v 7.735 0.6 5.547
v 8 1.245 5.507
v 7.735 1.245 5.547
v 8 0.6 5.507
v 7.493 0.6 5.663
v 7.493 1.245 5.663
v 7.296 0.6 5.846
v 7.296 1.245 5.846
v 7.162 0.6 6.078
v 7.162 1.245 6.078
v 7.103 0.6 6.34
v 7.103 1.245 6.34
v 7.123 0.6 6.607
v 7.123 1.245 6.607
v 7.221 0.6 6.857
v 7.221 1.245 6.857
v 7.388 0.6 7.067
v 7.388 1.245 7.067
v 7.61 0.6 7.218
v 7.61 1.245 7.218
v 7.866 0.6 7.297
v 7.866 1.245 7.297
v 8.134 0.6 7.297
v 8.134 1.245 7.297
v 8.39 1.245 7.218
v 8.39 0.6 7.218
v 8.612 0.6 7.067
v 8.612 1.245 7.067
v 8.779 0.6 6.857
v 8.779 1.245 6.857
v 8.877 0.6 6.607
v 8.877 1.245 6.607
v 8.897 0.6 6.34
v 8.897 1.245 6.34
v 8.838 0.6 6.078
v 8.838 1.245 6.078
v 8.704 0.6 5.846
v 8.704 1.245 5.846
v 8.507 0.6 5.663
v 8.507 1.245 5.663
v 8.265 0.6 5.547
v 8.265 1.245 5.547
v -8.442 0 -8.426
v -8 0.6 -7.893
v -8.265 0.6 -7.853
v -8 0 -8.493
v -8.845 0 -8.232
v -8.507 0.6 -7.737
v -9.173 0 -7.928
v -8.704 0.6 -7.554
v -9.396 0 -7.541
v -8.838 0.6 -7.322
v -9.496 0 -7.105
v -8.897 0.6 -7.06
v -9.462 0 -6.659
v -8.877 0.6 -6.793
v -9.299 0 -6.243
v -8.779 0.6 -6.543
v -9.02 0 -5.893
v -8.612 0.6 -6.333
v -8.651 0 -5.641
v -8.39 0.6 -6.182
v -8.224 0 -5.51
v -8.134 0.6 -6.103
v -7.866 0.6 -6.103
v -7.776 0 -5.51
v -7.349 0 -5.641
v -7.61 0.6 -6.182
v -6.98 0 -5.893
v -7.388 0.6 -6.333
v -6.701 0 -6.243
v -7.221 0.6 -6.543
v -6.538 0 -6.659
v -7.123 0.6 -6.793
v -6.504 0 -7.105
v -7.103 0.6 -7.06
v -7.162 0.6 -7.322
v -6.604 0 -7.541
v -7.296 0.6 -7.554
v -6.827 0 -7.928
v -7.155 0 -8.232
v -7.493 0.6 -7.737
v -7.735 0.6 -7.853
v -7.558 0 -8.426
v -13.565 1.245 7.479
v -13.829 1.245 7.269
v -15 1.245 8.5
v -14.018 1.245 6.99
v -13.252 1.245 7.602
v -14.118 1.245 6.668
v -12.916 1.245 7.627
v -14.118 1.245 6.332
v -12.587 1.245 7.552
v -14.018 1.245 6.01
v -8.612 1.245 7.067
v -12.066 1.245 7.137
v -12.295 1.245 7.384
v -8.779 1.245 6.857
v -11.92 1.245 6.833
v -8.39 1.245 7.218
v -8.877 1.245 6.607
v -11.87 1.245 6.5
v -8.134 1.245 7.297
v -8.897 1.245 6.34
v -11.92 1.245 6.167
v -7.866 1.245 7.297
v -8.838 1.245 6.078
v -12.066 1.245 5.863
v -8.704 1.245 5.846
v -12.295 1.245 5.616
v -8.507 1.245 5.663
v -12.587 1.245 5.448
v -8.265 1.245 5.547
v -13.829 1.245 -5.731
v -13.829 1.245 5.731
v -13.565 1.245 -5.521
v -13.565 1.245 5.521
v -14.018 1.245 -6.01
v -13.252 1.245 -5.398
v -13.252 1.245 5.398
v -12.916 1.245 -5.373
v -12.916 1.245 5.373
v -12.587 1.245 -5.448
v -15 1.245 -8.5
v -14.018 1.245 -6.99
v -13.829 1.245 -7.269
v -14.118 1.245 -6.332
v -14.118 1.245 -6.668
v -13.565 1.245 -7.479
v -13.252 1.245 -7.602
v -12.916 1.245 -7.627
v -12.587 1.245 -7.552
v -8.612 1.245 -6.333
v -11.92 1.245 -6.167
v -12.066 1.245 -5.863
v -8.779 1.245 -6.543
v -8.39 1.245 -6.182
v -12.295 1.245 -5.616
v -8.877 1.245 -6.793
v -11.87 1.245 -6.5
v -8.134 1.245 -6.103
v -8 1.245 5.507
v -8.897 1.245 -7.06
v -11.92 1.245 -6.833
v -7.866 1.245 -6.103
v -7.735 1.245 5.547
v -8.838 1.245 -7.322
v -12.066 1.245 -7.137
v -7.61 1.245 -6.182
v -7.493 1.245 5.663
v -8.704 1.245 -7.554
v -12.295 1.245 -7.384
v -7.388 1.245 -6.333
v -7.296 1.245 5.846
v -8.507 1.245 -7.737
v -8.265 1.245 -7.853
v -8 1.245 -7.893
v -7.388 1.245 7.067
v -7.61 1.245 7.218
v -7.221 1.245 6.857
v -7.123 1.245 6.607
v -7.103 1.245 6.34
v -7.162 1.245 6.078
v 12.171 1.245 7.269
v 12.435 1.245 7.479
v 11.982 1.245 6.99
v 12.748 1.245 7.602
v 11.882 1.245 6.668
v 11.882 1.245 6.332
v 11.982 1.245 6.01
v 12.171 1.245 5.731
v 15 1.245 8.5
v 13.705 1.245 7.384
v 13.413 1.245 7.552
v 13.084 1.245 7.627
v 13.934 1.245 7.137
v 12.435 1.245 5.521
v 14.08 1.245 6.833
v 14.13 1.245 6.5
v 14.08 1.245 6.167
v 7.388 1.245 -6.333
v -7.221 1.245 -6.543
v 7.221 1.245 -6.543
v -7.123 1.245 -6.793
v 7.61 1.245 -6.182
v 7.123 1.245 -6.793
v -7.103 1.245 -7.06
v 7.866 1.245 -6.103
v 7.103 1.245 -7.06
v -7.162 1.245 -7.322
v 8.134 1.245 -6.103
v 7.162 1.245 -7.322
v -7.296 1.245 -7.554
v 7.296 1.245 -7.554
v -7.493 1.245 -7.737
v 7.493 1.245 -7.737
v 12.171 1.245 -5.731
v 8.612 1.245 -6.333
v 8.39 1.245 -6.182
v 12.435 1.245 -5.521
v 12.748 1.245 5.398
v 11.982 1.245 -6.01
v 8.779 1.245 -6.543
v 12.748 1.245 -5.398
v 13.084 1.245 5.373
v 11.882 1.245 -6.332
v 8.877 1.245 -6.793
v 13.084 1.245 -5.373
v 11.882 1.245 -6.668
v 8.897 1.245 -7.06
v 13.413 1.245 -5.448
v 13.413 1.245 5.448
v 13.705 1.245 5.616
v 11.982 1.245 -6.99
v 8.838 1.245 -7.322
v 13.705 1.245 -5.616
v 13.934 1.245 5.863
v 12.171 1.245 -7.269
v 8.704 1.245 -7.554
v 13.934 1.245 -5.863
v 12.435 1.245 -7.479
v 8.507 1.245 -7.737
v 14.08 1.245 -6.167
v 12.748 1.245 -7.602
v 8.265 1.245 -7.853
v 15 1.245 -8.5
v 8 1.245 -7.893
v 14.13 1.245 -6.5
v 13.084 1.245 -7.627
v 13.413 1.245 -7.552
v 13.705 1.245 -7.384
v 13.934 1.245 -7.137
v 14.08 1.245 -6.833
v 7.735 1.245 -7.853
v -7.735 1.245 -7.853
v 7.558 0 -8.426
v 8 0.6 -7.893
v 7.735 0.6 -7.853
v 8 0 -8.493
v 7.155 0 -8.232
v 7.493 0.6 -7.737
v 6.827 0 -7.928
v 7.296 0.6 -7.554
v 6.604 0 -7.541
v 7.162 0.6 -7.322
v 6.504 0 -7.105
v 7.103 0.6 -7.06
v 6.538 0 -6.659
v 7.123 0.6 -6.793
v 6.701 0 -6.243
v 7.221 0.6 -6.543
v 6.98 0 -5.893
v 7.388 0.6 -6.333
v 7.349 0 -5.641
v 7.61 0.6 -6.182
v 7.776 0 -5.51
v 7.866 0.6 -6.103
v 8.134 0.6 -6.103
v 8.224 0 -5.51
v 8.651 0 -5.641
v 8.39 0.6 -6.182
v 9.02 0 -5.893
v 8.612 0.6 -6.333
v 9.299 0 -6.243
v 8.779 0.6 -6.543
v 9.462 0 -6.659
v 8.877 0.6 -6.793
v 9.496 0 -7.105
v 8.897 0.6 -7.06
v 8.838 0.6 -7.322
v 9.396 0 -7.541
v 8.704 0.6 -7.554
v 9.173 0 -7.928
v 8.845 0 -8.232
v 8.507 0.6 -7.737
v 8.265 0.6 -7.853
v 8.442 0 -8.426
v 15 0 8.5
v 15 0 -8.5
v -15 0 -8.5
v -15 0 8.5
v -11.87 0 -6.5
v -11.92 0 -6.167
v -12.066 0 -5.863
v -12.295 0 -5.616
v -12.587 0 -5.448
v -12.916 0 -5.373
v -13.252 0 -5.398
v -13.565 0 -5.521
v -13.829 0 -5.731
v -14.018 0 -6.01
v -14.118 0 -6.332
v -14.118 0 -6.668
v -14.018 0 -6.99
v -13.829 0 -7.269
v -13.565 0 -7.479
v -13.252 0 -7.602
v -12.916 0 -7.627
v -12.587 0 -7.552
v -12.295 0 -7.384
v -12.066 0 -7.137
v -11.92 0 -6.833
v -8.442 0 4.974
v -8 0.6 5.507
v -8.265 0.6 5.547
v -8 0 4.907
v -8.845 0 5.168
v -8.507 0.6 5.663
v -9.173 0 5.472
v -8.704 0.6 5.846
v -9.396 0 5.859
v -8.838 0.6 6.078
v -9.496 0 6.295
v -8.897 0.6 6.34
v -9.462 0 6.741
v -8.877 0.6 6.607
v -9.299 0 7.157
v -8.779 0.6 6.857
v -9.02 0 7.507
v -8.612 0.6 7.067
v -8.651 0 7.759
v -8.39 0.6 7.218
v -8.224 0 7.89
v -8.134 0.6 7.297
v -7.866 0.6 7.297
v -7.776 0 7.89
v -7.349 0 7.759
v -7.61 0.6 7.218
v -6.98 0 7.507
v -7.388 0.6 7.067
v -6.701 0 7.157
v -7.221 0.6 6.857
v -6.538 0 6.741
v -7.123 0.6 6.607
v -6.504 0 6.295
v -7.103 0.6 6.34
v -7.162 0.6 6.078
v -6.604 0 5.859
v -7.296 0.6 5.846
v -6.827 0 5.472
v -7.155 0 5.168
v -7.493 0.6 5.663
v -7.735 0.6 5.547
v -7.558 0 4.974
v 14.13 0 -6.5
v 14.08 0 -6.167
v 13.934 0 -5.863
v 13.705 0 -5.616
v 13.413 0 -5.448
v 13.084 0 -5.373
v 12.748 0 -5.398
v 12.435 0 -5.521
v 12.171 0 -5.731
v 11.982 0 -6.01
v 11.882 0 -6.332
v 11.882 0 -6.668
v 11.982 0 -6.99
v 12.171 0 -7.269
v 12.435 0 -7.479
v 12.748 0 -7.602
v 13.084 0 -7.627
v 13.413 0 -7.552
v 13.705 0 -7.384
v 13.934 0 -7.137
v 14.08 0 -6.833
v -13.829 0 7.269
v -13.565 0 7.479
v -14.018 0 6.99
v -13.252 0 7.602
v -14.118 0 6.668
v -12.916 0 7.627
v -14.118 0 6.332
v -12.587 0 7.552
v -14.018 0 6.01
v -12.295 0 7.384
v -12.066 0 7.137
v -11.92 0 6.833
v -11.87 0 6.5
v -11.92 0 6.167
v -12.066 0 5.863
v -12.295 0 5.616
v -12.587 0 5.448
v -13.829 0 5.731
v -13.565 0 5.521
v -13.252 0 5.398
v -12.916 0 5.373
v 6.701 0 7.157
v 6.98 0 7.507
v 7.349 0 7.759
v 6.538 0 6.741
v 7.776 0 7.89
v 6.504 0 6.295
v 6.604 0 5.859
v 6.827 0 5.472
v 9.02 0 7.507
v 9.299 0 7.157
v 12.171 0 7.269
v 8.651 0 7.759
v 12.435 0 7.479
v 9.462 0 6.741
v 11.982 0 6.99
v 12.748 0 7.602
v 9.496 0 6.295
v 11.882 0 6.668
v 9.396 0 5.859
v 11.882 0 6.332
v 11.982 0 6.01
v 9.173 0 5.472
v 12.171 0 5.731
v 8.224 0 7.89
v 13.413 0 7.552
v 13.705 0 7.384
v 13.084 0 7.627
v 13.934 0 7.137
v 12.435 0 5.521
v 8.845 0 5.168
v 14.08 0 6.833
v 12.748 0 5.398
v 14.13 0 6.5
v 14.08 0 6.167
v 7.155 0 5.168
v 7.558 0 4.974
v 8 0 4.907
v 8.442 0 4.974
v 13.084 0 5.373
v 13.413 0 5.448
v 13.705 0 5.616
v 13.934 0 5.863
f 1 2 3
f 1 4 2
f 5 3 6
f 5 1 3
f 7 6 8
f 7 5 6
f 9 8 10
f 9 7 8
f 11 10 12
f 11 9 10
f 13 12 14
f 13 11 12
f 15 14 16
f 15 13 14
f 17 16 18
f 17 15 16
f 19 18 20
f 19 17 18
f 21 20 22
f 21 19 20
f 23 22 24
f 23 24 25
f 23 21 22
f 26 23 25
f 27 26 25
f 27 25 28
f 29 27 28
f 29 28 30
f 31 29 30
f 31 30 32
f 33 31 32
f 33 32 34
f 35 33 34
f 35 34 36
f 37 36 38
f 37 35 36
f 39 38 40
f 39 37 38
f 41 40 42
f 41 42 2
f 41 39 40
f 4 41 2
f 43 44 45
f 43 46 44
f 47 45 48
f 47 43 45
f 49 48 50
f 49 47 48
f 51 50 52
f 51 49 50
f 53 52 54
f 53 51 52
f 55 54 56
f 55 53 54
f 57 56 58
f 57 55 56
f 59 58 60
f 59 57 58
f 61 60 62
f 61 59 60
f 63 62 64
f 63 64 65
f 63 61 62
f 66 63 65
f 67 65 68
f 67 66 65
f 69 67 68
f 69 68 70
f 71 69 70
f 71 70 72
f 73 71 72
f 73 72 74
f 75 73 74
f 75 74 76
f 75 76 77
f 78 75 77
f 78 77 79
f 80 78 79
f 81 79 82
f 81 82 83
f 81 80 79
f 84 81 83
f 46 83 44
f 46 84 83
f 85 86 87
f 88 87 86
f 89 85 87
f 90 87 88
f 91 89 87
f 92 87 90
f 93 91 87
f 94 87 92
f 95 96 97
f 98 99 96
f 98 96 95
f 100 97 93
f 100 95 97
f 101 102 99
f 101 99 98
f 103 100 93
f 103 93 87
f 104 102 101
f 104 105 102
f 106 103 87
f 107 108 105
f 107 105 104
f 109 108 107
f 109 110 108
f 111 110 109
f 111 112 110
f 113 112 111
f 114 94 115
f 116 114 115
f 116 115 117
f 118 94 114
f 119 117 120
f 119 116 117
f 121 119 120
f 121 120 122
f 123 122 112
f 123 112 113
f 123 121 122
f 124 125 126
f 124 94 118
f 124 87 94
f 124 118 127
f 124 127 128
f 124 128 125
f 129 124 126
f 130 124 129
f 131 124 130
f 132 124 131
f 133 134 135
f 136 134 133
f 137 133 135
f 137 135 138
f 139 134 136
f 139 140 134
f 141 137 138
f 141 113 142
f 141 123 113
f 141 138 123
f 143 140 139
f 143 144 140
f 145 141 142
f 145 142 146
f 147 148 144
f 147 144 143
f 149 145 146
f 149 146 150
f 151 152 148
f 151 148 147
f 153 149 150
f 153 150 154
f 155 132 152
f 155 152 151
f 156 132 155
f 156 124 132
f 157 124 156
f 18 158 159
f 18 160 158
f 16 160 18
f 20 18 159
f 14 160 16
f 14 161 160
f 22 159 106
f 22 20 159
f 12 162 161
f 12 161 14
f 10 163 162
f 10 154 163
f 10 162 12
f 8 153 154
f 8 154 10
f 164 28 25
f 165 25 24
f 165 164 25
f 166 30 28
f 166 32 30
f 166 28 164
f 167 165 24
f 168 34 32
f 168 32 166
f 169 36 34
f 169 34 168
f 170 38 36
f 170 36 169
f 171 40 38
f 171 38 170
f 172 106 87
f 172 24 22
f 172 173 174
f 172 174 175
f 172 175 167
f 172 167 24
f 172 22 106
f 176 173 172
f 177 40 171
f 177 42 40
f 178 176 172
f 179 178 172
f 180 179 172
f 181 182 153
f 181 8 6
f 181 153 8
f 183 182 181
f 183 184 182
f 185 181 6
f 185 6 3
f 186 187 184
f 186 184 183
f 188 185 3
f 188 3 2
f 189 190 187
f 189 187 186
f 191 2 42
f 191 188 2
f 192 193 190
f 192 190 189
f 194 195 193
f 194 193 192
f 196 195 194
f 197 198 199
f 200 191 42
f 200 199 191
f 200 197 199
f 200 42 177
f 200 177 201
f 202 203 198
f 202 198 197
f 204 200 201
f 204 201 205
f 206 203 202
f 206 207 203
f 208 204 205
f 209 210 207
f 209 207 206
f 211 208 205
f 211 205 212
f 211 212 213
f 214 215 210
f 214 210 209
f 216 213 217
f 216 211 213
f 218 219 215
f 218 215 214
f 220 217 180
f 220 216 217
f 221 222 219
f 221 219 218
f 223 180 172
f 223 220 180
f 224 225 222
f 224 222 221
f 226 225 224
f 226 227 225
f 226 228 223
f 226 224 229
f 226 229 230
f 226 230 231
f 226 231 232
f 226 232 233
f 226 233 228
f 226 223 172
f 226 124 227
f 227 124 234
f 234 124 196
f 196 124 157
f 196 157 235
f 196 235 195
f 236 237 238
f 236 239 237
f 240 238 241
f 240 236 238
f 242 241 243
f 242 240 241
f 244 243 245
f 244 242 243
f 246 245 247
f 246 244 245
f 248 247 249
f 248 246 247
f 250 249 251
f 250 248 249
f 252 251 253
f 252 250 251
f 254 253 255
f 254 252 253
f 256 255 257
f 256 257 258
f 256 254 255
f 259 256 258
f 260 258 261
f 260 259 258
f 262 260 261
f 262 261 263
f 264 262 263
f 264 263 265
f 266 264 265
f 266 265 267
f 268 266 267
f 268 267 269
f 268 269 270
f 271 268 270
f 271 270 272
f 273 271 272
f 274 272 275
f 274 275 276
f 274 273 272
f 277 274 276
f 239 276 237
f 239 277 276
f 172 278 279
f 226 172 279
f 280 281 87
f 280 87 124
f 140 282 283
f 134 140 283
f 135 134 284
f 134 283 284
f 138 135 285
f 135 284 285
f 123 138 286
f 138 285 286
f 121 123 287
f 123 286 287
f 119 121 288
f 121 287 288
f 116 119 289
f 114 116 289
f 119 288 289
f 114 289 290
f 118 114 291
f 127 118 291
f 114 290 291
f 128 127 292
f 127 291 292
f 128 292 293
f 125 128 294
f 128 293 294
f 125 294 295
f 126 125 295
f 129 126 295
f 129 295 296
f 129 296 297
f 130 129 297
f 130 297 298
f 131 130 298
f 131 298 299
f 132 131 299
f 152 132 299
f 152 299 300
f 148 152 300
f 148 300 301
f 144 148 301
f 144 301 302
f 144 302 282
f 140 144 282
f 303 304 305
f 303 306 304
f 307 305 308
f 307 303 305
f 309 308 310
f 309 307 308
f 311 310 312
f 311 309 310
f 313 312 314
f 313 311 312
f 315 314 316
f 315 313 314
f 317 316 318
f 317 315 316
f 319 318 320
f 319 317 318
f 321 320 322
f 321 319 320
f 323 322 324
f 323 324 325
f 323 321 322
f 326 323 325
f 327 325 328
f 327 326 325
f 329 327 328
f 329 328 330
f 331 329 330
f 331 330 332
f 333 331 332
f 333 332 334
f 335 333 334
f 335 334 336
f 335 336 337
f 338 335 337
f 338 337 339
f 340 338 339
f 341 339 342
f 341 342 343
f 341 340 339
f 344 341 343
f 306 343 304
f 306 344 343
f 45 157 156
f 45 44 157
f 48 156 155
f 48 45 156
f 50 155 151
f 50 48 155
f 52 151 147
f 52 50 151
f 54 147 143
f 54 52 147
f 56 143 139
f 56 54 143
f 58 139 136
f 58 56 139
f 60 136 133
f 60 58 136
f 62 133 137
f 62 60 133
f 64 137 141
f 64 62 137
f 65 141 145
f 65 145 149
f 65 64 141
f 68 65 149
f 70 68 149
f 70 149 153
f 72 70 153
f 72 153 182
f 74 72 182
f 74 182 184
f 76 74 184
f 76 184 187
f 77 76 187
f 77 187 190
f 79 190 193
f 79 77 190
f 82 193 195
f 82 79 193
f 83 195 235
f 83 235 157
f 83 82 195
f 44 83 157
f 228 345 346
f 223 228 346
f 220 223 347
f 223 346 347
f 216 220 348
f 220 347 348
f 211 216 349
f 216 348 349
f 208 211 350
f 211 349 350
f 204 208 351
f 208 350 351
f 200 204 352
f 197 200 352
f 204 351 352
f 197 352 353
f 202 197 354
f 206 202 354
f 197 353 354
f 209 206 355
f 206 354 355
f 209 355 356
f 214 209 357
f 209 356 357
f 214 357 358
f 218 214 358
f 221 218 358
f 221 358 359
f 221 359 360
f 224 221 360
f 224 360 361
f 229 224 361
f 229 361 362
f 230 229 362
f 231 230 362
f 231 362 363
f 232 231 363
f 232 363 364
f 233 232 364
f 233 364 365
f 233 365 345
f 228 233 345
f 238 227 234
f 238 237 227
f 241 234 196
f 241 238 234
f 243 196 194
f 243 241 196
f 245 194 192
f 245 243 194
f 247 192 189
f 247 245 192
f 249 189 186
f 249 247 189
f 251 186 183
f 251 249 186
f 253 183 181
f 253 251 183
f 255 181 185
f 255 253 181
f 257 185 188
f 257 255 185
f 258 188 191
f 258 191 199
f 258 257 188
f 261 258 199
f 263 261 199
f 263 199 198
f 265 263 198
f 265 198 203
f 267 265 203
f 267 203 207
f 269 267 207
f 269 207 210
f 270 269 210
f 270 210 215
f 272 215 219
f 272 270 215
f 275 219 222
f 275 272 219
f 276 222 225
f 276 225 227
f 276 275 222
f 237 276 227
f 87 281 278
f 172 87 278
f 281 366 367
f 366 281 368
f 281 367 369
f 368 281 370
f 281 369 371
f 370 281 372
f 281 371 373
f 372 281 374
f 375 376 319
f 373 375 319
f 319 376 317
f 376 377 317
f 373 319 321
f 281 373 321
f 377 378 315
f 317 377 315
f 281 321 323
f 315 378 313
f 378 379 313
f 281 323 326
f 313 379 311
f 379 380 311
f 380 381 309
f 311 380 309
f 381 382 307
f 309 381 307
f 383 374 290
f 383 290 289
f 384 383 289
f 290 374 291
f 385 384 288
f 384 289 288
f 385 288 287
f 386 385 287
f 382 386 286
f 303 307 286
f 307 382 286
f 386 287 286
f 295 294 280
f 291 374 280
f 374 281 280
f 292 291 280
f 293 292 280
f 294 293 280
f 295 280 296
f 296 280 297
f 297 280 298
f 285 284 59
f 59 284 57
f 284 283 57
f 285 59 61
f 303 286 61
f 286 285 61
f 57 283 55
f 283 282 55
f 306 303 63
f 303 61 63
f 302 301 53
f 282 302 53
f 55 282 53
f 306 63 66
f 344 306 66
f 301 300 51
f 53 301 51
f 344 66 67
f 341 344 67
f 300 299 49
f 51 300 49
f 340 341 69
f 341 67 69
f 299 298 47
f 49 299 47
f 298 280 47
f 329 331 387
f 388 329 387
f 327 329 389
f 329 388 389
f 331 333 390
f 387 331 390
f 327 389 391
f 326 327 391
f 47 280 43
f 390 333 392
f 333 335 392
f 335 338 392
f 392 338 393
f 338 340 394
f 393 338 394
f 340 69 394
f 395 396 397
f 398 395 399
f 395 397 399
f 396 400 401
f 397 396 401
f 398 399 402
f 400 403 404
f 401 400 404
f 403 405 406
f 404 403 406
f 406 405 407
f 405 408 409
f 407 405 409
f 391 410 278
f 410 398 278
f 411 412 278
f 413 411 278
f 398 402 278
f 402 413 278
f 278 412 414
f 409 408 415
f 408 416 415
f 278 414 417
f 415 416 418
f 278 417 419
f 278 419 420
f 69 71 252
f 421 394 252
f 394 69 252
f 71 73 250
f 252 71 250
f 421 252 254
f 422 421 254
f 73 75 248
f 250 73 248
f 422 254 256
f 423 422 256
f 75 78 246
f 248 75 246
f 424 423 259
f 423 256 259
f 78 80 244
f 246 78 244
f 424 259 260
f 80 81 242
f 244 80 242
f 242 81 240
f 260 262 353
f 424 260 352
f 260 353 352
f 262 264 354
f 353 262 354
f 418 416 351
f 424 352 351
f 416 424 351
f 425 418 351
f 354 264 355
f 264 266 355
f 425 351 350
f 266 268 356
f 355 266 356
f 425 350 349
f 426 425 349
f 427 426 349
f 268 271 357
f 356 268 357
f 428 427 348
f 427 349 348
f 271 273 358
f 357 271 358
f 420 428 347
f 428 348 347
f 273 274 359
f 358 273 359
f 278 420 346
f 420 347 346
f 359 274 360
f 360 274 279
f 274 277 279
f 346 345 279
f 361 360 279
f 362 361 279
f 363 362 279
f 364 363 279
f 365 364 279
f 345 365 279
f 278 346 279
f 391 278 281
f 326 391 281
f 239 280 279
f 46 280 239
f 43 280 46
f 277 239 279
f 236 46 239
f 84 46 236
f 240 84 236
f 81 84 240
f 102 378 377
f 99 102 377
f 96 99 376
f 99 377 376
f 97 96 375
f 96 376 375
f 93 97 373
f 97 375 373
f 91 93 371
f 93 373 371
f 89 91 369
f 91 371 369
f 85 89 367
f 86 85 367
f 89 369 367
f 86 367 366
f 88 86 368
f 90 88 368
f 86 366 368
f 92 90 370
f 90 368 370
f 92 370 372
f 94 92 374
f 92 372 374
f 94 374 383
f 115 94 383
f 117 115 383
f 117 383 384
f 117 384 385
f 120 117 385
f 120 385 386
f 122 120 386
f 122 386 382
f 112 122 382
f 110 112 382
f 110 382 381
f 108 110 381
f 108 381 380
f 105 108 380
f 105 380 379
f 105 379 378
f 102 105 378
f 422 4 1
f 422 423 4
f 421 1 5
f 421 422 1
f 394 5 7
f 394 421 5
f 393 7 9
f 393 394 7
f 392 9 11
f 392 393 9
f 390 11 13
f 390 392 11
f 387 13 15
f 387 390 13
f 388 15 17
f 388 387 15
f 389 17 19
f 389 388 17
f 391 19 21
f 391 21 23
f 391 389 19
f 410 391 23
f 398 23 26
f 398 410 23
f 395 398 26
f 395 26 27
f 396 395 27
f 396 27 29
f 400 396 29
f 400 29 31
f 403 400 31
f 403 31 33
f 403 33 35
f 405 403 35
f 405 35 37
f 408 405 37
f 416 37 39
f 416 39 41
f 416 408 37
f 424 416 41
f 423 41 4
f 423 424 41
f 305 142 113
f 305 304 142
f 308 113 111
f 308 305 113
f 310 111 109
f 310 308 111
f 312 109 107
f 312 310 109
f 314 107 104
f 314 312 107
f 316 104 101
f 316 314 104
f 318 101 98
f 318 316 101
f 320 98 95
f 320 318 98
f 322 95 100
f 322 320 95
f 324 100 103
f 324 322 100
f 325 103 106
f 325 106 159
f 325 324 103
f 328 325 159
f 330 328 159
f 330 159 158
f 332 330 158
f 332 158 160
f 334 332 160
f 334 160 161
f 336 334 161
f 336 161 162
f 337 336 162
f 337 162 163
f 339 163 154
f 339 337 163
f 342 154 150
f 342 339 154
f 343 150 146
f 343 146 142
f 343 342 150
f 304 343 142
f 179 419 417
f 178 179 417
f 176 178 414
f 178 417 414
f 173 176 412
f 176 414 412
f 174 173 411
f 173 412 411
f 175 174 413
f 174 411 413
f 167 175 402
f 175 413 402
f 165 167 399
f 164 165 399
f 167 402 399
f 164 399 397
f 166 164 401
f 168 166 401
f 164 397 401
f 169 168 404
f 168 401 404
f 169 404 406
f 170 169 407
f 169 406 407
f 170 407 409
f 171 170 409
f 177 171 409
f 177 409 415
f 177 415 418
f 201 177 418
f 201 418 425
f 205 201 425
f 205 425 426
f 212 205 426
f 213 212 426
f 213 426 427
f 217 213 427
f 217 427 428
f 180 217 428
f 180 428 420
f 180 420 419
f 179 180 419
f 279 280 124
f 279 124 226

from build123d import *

# Parameters (mm, degrees)
SKETCH1_W                       = 30
SKETCH1_H                       = 17
BOSS_EXTRUDE1_DEPTH             = 1.2446
M1_6_CLEARANCE_HOLE1_AT_2_COUNT = 2
M1_6_CLEARANCE_HOLE1_AT_2_PITCH = 16
M1_6_CLEARANCE_HOLE1_AT_3_COUNT = 2
M1_6_CLEARANCE_HOLE1_AT_3_PITCH = 13.4
M1_6_CLEARANCE_HOLE1_AT_4_COUNT = 2
M1_6_CLEARANCE_HOLE1_AT_4_PITCH = 20.870074269
F_2_CLEARANCE_HOLE1_D           = 2.2606
F_2_CLEARANCE_HOLE1_DEPTH       = 2.032
F_2_CLEARANCE_HOLE1_TIP         = 0.679152758


with BuildPart() as part:
    # Sketch1 → Boss-Extrude1 (new body)
    with BuildSketch(Plane(origin=(0, 0, 0), x_dir=(1, 0, 0), z_dir=(0, 1, 0))):
        Rectangle(SKETCH1_W, SKETCH1_H)
    extrude(amount=BOSS_EXTRUDE1_DEPTH)

    # Sketch4 → M1.6 Clearance Hole1 (revolve, cut)
    with BuildSketch(Plane(origin=(-8, 0, 6.407104521), x_dir=(0, 0, -1), z_dir=(1, 0, 0))):
        Polygon((0, 0), (0, 1.2446), (0.9, 1.2446), (0.9, 0.6), (1.5, 0), align=None)
    m1_6_clearance_hole1 = revolve(axis=Axis((-8, -6.35, 6.407104521), (0, 1, 0)), mode=Mode.SUBTRACT)

    # M1.6 Clearance Hole1 at 2: M1.6 Clearance Hole1 ×2
    with Locations(*[(i * M1_6_CLEARANCE_HOLE1_AT_2_PITCH, 0, 0) for i in range(1, M1_6_CLEARANCE_HOLE1_AT_2_COUNT)]):
        add(m1_6_clearance_hole1, mode=Mode.SUBTRACT)

    # M1.6 Clearance Hole1 at 3: M1.6 Clearance Hole1 ×2
    with Locations(*[(0, 0, -i * M1_6_CLEARANCE_HOLE1_AT_3_PITCH) for i in range(1, M1_6_CLEARANCE_HOLE1_AT_3_COUNT)]):
        add(m1_6_clearance_hole1, mode=Mode.SUBTRACT)

    # M1.6 Clearance Hole1 at 4: M1.6 Clearance Hole1 ×2
    with Locations(*[Vector(0.766647967, 0, -0.642067672) * (i * M1_6_CLEARANCE_HOLE1_AT_4_PITCH) for i in range(1, M1_6_CLEARANCE_HOLE1_AT_4_COUNT)]):
        add(m1_6_clearance_hole1, mode=Mode.SUBTRACT)

    # #2 Clearance Hole1
    with Locations(Plane(origin=(0, 1.2446, 0), x_dir=(-1, 0, 0), z_dir=(0, 1, 0))):
        with Locations((13, -6.5), (13, 6.5), (-13, -6.5), (-13, 6.5)):
            Hole(F_2_CLEARANCE_HOLE1_D / 2, depth=F_2_CLEARANCE_HOLE1_DEPTH)
            with Locations((0, 0, -(F_2_CLEARANCE_HOLE1_DEPTH + F_2_CLEARANCE_HOLE1_TIP / 2))):  # 118° drill point
                Cone(0, F_2_CLEARANCE_HOLE1_D / 2, F_2_CLEARANCE_HOLE1_TIP, mode=Mode.SUBTRACT)


solid = part.part
